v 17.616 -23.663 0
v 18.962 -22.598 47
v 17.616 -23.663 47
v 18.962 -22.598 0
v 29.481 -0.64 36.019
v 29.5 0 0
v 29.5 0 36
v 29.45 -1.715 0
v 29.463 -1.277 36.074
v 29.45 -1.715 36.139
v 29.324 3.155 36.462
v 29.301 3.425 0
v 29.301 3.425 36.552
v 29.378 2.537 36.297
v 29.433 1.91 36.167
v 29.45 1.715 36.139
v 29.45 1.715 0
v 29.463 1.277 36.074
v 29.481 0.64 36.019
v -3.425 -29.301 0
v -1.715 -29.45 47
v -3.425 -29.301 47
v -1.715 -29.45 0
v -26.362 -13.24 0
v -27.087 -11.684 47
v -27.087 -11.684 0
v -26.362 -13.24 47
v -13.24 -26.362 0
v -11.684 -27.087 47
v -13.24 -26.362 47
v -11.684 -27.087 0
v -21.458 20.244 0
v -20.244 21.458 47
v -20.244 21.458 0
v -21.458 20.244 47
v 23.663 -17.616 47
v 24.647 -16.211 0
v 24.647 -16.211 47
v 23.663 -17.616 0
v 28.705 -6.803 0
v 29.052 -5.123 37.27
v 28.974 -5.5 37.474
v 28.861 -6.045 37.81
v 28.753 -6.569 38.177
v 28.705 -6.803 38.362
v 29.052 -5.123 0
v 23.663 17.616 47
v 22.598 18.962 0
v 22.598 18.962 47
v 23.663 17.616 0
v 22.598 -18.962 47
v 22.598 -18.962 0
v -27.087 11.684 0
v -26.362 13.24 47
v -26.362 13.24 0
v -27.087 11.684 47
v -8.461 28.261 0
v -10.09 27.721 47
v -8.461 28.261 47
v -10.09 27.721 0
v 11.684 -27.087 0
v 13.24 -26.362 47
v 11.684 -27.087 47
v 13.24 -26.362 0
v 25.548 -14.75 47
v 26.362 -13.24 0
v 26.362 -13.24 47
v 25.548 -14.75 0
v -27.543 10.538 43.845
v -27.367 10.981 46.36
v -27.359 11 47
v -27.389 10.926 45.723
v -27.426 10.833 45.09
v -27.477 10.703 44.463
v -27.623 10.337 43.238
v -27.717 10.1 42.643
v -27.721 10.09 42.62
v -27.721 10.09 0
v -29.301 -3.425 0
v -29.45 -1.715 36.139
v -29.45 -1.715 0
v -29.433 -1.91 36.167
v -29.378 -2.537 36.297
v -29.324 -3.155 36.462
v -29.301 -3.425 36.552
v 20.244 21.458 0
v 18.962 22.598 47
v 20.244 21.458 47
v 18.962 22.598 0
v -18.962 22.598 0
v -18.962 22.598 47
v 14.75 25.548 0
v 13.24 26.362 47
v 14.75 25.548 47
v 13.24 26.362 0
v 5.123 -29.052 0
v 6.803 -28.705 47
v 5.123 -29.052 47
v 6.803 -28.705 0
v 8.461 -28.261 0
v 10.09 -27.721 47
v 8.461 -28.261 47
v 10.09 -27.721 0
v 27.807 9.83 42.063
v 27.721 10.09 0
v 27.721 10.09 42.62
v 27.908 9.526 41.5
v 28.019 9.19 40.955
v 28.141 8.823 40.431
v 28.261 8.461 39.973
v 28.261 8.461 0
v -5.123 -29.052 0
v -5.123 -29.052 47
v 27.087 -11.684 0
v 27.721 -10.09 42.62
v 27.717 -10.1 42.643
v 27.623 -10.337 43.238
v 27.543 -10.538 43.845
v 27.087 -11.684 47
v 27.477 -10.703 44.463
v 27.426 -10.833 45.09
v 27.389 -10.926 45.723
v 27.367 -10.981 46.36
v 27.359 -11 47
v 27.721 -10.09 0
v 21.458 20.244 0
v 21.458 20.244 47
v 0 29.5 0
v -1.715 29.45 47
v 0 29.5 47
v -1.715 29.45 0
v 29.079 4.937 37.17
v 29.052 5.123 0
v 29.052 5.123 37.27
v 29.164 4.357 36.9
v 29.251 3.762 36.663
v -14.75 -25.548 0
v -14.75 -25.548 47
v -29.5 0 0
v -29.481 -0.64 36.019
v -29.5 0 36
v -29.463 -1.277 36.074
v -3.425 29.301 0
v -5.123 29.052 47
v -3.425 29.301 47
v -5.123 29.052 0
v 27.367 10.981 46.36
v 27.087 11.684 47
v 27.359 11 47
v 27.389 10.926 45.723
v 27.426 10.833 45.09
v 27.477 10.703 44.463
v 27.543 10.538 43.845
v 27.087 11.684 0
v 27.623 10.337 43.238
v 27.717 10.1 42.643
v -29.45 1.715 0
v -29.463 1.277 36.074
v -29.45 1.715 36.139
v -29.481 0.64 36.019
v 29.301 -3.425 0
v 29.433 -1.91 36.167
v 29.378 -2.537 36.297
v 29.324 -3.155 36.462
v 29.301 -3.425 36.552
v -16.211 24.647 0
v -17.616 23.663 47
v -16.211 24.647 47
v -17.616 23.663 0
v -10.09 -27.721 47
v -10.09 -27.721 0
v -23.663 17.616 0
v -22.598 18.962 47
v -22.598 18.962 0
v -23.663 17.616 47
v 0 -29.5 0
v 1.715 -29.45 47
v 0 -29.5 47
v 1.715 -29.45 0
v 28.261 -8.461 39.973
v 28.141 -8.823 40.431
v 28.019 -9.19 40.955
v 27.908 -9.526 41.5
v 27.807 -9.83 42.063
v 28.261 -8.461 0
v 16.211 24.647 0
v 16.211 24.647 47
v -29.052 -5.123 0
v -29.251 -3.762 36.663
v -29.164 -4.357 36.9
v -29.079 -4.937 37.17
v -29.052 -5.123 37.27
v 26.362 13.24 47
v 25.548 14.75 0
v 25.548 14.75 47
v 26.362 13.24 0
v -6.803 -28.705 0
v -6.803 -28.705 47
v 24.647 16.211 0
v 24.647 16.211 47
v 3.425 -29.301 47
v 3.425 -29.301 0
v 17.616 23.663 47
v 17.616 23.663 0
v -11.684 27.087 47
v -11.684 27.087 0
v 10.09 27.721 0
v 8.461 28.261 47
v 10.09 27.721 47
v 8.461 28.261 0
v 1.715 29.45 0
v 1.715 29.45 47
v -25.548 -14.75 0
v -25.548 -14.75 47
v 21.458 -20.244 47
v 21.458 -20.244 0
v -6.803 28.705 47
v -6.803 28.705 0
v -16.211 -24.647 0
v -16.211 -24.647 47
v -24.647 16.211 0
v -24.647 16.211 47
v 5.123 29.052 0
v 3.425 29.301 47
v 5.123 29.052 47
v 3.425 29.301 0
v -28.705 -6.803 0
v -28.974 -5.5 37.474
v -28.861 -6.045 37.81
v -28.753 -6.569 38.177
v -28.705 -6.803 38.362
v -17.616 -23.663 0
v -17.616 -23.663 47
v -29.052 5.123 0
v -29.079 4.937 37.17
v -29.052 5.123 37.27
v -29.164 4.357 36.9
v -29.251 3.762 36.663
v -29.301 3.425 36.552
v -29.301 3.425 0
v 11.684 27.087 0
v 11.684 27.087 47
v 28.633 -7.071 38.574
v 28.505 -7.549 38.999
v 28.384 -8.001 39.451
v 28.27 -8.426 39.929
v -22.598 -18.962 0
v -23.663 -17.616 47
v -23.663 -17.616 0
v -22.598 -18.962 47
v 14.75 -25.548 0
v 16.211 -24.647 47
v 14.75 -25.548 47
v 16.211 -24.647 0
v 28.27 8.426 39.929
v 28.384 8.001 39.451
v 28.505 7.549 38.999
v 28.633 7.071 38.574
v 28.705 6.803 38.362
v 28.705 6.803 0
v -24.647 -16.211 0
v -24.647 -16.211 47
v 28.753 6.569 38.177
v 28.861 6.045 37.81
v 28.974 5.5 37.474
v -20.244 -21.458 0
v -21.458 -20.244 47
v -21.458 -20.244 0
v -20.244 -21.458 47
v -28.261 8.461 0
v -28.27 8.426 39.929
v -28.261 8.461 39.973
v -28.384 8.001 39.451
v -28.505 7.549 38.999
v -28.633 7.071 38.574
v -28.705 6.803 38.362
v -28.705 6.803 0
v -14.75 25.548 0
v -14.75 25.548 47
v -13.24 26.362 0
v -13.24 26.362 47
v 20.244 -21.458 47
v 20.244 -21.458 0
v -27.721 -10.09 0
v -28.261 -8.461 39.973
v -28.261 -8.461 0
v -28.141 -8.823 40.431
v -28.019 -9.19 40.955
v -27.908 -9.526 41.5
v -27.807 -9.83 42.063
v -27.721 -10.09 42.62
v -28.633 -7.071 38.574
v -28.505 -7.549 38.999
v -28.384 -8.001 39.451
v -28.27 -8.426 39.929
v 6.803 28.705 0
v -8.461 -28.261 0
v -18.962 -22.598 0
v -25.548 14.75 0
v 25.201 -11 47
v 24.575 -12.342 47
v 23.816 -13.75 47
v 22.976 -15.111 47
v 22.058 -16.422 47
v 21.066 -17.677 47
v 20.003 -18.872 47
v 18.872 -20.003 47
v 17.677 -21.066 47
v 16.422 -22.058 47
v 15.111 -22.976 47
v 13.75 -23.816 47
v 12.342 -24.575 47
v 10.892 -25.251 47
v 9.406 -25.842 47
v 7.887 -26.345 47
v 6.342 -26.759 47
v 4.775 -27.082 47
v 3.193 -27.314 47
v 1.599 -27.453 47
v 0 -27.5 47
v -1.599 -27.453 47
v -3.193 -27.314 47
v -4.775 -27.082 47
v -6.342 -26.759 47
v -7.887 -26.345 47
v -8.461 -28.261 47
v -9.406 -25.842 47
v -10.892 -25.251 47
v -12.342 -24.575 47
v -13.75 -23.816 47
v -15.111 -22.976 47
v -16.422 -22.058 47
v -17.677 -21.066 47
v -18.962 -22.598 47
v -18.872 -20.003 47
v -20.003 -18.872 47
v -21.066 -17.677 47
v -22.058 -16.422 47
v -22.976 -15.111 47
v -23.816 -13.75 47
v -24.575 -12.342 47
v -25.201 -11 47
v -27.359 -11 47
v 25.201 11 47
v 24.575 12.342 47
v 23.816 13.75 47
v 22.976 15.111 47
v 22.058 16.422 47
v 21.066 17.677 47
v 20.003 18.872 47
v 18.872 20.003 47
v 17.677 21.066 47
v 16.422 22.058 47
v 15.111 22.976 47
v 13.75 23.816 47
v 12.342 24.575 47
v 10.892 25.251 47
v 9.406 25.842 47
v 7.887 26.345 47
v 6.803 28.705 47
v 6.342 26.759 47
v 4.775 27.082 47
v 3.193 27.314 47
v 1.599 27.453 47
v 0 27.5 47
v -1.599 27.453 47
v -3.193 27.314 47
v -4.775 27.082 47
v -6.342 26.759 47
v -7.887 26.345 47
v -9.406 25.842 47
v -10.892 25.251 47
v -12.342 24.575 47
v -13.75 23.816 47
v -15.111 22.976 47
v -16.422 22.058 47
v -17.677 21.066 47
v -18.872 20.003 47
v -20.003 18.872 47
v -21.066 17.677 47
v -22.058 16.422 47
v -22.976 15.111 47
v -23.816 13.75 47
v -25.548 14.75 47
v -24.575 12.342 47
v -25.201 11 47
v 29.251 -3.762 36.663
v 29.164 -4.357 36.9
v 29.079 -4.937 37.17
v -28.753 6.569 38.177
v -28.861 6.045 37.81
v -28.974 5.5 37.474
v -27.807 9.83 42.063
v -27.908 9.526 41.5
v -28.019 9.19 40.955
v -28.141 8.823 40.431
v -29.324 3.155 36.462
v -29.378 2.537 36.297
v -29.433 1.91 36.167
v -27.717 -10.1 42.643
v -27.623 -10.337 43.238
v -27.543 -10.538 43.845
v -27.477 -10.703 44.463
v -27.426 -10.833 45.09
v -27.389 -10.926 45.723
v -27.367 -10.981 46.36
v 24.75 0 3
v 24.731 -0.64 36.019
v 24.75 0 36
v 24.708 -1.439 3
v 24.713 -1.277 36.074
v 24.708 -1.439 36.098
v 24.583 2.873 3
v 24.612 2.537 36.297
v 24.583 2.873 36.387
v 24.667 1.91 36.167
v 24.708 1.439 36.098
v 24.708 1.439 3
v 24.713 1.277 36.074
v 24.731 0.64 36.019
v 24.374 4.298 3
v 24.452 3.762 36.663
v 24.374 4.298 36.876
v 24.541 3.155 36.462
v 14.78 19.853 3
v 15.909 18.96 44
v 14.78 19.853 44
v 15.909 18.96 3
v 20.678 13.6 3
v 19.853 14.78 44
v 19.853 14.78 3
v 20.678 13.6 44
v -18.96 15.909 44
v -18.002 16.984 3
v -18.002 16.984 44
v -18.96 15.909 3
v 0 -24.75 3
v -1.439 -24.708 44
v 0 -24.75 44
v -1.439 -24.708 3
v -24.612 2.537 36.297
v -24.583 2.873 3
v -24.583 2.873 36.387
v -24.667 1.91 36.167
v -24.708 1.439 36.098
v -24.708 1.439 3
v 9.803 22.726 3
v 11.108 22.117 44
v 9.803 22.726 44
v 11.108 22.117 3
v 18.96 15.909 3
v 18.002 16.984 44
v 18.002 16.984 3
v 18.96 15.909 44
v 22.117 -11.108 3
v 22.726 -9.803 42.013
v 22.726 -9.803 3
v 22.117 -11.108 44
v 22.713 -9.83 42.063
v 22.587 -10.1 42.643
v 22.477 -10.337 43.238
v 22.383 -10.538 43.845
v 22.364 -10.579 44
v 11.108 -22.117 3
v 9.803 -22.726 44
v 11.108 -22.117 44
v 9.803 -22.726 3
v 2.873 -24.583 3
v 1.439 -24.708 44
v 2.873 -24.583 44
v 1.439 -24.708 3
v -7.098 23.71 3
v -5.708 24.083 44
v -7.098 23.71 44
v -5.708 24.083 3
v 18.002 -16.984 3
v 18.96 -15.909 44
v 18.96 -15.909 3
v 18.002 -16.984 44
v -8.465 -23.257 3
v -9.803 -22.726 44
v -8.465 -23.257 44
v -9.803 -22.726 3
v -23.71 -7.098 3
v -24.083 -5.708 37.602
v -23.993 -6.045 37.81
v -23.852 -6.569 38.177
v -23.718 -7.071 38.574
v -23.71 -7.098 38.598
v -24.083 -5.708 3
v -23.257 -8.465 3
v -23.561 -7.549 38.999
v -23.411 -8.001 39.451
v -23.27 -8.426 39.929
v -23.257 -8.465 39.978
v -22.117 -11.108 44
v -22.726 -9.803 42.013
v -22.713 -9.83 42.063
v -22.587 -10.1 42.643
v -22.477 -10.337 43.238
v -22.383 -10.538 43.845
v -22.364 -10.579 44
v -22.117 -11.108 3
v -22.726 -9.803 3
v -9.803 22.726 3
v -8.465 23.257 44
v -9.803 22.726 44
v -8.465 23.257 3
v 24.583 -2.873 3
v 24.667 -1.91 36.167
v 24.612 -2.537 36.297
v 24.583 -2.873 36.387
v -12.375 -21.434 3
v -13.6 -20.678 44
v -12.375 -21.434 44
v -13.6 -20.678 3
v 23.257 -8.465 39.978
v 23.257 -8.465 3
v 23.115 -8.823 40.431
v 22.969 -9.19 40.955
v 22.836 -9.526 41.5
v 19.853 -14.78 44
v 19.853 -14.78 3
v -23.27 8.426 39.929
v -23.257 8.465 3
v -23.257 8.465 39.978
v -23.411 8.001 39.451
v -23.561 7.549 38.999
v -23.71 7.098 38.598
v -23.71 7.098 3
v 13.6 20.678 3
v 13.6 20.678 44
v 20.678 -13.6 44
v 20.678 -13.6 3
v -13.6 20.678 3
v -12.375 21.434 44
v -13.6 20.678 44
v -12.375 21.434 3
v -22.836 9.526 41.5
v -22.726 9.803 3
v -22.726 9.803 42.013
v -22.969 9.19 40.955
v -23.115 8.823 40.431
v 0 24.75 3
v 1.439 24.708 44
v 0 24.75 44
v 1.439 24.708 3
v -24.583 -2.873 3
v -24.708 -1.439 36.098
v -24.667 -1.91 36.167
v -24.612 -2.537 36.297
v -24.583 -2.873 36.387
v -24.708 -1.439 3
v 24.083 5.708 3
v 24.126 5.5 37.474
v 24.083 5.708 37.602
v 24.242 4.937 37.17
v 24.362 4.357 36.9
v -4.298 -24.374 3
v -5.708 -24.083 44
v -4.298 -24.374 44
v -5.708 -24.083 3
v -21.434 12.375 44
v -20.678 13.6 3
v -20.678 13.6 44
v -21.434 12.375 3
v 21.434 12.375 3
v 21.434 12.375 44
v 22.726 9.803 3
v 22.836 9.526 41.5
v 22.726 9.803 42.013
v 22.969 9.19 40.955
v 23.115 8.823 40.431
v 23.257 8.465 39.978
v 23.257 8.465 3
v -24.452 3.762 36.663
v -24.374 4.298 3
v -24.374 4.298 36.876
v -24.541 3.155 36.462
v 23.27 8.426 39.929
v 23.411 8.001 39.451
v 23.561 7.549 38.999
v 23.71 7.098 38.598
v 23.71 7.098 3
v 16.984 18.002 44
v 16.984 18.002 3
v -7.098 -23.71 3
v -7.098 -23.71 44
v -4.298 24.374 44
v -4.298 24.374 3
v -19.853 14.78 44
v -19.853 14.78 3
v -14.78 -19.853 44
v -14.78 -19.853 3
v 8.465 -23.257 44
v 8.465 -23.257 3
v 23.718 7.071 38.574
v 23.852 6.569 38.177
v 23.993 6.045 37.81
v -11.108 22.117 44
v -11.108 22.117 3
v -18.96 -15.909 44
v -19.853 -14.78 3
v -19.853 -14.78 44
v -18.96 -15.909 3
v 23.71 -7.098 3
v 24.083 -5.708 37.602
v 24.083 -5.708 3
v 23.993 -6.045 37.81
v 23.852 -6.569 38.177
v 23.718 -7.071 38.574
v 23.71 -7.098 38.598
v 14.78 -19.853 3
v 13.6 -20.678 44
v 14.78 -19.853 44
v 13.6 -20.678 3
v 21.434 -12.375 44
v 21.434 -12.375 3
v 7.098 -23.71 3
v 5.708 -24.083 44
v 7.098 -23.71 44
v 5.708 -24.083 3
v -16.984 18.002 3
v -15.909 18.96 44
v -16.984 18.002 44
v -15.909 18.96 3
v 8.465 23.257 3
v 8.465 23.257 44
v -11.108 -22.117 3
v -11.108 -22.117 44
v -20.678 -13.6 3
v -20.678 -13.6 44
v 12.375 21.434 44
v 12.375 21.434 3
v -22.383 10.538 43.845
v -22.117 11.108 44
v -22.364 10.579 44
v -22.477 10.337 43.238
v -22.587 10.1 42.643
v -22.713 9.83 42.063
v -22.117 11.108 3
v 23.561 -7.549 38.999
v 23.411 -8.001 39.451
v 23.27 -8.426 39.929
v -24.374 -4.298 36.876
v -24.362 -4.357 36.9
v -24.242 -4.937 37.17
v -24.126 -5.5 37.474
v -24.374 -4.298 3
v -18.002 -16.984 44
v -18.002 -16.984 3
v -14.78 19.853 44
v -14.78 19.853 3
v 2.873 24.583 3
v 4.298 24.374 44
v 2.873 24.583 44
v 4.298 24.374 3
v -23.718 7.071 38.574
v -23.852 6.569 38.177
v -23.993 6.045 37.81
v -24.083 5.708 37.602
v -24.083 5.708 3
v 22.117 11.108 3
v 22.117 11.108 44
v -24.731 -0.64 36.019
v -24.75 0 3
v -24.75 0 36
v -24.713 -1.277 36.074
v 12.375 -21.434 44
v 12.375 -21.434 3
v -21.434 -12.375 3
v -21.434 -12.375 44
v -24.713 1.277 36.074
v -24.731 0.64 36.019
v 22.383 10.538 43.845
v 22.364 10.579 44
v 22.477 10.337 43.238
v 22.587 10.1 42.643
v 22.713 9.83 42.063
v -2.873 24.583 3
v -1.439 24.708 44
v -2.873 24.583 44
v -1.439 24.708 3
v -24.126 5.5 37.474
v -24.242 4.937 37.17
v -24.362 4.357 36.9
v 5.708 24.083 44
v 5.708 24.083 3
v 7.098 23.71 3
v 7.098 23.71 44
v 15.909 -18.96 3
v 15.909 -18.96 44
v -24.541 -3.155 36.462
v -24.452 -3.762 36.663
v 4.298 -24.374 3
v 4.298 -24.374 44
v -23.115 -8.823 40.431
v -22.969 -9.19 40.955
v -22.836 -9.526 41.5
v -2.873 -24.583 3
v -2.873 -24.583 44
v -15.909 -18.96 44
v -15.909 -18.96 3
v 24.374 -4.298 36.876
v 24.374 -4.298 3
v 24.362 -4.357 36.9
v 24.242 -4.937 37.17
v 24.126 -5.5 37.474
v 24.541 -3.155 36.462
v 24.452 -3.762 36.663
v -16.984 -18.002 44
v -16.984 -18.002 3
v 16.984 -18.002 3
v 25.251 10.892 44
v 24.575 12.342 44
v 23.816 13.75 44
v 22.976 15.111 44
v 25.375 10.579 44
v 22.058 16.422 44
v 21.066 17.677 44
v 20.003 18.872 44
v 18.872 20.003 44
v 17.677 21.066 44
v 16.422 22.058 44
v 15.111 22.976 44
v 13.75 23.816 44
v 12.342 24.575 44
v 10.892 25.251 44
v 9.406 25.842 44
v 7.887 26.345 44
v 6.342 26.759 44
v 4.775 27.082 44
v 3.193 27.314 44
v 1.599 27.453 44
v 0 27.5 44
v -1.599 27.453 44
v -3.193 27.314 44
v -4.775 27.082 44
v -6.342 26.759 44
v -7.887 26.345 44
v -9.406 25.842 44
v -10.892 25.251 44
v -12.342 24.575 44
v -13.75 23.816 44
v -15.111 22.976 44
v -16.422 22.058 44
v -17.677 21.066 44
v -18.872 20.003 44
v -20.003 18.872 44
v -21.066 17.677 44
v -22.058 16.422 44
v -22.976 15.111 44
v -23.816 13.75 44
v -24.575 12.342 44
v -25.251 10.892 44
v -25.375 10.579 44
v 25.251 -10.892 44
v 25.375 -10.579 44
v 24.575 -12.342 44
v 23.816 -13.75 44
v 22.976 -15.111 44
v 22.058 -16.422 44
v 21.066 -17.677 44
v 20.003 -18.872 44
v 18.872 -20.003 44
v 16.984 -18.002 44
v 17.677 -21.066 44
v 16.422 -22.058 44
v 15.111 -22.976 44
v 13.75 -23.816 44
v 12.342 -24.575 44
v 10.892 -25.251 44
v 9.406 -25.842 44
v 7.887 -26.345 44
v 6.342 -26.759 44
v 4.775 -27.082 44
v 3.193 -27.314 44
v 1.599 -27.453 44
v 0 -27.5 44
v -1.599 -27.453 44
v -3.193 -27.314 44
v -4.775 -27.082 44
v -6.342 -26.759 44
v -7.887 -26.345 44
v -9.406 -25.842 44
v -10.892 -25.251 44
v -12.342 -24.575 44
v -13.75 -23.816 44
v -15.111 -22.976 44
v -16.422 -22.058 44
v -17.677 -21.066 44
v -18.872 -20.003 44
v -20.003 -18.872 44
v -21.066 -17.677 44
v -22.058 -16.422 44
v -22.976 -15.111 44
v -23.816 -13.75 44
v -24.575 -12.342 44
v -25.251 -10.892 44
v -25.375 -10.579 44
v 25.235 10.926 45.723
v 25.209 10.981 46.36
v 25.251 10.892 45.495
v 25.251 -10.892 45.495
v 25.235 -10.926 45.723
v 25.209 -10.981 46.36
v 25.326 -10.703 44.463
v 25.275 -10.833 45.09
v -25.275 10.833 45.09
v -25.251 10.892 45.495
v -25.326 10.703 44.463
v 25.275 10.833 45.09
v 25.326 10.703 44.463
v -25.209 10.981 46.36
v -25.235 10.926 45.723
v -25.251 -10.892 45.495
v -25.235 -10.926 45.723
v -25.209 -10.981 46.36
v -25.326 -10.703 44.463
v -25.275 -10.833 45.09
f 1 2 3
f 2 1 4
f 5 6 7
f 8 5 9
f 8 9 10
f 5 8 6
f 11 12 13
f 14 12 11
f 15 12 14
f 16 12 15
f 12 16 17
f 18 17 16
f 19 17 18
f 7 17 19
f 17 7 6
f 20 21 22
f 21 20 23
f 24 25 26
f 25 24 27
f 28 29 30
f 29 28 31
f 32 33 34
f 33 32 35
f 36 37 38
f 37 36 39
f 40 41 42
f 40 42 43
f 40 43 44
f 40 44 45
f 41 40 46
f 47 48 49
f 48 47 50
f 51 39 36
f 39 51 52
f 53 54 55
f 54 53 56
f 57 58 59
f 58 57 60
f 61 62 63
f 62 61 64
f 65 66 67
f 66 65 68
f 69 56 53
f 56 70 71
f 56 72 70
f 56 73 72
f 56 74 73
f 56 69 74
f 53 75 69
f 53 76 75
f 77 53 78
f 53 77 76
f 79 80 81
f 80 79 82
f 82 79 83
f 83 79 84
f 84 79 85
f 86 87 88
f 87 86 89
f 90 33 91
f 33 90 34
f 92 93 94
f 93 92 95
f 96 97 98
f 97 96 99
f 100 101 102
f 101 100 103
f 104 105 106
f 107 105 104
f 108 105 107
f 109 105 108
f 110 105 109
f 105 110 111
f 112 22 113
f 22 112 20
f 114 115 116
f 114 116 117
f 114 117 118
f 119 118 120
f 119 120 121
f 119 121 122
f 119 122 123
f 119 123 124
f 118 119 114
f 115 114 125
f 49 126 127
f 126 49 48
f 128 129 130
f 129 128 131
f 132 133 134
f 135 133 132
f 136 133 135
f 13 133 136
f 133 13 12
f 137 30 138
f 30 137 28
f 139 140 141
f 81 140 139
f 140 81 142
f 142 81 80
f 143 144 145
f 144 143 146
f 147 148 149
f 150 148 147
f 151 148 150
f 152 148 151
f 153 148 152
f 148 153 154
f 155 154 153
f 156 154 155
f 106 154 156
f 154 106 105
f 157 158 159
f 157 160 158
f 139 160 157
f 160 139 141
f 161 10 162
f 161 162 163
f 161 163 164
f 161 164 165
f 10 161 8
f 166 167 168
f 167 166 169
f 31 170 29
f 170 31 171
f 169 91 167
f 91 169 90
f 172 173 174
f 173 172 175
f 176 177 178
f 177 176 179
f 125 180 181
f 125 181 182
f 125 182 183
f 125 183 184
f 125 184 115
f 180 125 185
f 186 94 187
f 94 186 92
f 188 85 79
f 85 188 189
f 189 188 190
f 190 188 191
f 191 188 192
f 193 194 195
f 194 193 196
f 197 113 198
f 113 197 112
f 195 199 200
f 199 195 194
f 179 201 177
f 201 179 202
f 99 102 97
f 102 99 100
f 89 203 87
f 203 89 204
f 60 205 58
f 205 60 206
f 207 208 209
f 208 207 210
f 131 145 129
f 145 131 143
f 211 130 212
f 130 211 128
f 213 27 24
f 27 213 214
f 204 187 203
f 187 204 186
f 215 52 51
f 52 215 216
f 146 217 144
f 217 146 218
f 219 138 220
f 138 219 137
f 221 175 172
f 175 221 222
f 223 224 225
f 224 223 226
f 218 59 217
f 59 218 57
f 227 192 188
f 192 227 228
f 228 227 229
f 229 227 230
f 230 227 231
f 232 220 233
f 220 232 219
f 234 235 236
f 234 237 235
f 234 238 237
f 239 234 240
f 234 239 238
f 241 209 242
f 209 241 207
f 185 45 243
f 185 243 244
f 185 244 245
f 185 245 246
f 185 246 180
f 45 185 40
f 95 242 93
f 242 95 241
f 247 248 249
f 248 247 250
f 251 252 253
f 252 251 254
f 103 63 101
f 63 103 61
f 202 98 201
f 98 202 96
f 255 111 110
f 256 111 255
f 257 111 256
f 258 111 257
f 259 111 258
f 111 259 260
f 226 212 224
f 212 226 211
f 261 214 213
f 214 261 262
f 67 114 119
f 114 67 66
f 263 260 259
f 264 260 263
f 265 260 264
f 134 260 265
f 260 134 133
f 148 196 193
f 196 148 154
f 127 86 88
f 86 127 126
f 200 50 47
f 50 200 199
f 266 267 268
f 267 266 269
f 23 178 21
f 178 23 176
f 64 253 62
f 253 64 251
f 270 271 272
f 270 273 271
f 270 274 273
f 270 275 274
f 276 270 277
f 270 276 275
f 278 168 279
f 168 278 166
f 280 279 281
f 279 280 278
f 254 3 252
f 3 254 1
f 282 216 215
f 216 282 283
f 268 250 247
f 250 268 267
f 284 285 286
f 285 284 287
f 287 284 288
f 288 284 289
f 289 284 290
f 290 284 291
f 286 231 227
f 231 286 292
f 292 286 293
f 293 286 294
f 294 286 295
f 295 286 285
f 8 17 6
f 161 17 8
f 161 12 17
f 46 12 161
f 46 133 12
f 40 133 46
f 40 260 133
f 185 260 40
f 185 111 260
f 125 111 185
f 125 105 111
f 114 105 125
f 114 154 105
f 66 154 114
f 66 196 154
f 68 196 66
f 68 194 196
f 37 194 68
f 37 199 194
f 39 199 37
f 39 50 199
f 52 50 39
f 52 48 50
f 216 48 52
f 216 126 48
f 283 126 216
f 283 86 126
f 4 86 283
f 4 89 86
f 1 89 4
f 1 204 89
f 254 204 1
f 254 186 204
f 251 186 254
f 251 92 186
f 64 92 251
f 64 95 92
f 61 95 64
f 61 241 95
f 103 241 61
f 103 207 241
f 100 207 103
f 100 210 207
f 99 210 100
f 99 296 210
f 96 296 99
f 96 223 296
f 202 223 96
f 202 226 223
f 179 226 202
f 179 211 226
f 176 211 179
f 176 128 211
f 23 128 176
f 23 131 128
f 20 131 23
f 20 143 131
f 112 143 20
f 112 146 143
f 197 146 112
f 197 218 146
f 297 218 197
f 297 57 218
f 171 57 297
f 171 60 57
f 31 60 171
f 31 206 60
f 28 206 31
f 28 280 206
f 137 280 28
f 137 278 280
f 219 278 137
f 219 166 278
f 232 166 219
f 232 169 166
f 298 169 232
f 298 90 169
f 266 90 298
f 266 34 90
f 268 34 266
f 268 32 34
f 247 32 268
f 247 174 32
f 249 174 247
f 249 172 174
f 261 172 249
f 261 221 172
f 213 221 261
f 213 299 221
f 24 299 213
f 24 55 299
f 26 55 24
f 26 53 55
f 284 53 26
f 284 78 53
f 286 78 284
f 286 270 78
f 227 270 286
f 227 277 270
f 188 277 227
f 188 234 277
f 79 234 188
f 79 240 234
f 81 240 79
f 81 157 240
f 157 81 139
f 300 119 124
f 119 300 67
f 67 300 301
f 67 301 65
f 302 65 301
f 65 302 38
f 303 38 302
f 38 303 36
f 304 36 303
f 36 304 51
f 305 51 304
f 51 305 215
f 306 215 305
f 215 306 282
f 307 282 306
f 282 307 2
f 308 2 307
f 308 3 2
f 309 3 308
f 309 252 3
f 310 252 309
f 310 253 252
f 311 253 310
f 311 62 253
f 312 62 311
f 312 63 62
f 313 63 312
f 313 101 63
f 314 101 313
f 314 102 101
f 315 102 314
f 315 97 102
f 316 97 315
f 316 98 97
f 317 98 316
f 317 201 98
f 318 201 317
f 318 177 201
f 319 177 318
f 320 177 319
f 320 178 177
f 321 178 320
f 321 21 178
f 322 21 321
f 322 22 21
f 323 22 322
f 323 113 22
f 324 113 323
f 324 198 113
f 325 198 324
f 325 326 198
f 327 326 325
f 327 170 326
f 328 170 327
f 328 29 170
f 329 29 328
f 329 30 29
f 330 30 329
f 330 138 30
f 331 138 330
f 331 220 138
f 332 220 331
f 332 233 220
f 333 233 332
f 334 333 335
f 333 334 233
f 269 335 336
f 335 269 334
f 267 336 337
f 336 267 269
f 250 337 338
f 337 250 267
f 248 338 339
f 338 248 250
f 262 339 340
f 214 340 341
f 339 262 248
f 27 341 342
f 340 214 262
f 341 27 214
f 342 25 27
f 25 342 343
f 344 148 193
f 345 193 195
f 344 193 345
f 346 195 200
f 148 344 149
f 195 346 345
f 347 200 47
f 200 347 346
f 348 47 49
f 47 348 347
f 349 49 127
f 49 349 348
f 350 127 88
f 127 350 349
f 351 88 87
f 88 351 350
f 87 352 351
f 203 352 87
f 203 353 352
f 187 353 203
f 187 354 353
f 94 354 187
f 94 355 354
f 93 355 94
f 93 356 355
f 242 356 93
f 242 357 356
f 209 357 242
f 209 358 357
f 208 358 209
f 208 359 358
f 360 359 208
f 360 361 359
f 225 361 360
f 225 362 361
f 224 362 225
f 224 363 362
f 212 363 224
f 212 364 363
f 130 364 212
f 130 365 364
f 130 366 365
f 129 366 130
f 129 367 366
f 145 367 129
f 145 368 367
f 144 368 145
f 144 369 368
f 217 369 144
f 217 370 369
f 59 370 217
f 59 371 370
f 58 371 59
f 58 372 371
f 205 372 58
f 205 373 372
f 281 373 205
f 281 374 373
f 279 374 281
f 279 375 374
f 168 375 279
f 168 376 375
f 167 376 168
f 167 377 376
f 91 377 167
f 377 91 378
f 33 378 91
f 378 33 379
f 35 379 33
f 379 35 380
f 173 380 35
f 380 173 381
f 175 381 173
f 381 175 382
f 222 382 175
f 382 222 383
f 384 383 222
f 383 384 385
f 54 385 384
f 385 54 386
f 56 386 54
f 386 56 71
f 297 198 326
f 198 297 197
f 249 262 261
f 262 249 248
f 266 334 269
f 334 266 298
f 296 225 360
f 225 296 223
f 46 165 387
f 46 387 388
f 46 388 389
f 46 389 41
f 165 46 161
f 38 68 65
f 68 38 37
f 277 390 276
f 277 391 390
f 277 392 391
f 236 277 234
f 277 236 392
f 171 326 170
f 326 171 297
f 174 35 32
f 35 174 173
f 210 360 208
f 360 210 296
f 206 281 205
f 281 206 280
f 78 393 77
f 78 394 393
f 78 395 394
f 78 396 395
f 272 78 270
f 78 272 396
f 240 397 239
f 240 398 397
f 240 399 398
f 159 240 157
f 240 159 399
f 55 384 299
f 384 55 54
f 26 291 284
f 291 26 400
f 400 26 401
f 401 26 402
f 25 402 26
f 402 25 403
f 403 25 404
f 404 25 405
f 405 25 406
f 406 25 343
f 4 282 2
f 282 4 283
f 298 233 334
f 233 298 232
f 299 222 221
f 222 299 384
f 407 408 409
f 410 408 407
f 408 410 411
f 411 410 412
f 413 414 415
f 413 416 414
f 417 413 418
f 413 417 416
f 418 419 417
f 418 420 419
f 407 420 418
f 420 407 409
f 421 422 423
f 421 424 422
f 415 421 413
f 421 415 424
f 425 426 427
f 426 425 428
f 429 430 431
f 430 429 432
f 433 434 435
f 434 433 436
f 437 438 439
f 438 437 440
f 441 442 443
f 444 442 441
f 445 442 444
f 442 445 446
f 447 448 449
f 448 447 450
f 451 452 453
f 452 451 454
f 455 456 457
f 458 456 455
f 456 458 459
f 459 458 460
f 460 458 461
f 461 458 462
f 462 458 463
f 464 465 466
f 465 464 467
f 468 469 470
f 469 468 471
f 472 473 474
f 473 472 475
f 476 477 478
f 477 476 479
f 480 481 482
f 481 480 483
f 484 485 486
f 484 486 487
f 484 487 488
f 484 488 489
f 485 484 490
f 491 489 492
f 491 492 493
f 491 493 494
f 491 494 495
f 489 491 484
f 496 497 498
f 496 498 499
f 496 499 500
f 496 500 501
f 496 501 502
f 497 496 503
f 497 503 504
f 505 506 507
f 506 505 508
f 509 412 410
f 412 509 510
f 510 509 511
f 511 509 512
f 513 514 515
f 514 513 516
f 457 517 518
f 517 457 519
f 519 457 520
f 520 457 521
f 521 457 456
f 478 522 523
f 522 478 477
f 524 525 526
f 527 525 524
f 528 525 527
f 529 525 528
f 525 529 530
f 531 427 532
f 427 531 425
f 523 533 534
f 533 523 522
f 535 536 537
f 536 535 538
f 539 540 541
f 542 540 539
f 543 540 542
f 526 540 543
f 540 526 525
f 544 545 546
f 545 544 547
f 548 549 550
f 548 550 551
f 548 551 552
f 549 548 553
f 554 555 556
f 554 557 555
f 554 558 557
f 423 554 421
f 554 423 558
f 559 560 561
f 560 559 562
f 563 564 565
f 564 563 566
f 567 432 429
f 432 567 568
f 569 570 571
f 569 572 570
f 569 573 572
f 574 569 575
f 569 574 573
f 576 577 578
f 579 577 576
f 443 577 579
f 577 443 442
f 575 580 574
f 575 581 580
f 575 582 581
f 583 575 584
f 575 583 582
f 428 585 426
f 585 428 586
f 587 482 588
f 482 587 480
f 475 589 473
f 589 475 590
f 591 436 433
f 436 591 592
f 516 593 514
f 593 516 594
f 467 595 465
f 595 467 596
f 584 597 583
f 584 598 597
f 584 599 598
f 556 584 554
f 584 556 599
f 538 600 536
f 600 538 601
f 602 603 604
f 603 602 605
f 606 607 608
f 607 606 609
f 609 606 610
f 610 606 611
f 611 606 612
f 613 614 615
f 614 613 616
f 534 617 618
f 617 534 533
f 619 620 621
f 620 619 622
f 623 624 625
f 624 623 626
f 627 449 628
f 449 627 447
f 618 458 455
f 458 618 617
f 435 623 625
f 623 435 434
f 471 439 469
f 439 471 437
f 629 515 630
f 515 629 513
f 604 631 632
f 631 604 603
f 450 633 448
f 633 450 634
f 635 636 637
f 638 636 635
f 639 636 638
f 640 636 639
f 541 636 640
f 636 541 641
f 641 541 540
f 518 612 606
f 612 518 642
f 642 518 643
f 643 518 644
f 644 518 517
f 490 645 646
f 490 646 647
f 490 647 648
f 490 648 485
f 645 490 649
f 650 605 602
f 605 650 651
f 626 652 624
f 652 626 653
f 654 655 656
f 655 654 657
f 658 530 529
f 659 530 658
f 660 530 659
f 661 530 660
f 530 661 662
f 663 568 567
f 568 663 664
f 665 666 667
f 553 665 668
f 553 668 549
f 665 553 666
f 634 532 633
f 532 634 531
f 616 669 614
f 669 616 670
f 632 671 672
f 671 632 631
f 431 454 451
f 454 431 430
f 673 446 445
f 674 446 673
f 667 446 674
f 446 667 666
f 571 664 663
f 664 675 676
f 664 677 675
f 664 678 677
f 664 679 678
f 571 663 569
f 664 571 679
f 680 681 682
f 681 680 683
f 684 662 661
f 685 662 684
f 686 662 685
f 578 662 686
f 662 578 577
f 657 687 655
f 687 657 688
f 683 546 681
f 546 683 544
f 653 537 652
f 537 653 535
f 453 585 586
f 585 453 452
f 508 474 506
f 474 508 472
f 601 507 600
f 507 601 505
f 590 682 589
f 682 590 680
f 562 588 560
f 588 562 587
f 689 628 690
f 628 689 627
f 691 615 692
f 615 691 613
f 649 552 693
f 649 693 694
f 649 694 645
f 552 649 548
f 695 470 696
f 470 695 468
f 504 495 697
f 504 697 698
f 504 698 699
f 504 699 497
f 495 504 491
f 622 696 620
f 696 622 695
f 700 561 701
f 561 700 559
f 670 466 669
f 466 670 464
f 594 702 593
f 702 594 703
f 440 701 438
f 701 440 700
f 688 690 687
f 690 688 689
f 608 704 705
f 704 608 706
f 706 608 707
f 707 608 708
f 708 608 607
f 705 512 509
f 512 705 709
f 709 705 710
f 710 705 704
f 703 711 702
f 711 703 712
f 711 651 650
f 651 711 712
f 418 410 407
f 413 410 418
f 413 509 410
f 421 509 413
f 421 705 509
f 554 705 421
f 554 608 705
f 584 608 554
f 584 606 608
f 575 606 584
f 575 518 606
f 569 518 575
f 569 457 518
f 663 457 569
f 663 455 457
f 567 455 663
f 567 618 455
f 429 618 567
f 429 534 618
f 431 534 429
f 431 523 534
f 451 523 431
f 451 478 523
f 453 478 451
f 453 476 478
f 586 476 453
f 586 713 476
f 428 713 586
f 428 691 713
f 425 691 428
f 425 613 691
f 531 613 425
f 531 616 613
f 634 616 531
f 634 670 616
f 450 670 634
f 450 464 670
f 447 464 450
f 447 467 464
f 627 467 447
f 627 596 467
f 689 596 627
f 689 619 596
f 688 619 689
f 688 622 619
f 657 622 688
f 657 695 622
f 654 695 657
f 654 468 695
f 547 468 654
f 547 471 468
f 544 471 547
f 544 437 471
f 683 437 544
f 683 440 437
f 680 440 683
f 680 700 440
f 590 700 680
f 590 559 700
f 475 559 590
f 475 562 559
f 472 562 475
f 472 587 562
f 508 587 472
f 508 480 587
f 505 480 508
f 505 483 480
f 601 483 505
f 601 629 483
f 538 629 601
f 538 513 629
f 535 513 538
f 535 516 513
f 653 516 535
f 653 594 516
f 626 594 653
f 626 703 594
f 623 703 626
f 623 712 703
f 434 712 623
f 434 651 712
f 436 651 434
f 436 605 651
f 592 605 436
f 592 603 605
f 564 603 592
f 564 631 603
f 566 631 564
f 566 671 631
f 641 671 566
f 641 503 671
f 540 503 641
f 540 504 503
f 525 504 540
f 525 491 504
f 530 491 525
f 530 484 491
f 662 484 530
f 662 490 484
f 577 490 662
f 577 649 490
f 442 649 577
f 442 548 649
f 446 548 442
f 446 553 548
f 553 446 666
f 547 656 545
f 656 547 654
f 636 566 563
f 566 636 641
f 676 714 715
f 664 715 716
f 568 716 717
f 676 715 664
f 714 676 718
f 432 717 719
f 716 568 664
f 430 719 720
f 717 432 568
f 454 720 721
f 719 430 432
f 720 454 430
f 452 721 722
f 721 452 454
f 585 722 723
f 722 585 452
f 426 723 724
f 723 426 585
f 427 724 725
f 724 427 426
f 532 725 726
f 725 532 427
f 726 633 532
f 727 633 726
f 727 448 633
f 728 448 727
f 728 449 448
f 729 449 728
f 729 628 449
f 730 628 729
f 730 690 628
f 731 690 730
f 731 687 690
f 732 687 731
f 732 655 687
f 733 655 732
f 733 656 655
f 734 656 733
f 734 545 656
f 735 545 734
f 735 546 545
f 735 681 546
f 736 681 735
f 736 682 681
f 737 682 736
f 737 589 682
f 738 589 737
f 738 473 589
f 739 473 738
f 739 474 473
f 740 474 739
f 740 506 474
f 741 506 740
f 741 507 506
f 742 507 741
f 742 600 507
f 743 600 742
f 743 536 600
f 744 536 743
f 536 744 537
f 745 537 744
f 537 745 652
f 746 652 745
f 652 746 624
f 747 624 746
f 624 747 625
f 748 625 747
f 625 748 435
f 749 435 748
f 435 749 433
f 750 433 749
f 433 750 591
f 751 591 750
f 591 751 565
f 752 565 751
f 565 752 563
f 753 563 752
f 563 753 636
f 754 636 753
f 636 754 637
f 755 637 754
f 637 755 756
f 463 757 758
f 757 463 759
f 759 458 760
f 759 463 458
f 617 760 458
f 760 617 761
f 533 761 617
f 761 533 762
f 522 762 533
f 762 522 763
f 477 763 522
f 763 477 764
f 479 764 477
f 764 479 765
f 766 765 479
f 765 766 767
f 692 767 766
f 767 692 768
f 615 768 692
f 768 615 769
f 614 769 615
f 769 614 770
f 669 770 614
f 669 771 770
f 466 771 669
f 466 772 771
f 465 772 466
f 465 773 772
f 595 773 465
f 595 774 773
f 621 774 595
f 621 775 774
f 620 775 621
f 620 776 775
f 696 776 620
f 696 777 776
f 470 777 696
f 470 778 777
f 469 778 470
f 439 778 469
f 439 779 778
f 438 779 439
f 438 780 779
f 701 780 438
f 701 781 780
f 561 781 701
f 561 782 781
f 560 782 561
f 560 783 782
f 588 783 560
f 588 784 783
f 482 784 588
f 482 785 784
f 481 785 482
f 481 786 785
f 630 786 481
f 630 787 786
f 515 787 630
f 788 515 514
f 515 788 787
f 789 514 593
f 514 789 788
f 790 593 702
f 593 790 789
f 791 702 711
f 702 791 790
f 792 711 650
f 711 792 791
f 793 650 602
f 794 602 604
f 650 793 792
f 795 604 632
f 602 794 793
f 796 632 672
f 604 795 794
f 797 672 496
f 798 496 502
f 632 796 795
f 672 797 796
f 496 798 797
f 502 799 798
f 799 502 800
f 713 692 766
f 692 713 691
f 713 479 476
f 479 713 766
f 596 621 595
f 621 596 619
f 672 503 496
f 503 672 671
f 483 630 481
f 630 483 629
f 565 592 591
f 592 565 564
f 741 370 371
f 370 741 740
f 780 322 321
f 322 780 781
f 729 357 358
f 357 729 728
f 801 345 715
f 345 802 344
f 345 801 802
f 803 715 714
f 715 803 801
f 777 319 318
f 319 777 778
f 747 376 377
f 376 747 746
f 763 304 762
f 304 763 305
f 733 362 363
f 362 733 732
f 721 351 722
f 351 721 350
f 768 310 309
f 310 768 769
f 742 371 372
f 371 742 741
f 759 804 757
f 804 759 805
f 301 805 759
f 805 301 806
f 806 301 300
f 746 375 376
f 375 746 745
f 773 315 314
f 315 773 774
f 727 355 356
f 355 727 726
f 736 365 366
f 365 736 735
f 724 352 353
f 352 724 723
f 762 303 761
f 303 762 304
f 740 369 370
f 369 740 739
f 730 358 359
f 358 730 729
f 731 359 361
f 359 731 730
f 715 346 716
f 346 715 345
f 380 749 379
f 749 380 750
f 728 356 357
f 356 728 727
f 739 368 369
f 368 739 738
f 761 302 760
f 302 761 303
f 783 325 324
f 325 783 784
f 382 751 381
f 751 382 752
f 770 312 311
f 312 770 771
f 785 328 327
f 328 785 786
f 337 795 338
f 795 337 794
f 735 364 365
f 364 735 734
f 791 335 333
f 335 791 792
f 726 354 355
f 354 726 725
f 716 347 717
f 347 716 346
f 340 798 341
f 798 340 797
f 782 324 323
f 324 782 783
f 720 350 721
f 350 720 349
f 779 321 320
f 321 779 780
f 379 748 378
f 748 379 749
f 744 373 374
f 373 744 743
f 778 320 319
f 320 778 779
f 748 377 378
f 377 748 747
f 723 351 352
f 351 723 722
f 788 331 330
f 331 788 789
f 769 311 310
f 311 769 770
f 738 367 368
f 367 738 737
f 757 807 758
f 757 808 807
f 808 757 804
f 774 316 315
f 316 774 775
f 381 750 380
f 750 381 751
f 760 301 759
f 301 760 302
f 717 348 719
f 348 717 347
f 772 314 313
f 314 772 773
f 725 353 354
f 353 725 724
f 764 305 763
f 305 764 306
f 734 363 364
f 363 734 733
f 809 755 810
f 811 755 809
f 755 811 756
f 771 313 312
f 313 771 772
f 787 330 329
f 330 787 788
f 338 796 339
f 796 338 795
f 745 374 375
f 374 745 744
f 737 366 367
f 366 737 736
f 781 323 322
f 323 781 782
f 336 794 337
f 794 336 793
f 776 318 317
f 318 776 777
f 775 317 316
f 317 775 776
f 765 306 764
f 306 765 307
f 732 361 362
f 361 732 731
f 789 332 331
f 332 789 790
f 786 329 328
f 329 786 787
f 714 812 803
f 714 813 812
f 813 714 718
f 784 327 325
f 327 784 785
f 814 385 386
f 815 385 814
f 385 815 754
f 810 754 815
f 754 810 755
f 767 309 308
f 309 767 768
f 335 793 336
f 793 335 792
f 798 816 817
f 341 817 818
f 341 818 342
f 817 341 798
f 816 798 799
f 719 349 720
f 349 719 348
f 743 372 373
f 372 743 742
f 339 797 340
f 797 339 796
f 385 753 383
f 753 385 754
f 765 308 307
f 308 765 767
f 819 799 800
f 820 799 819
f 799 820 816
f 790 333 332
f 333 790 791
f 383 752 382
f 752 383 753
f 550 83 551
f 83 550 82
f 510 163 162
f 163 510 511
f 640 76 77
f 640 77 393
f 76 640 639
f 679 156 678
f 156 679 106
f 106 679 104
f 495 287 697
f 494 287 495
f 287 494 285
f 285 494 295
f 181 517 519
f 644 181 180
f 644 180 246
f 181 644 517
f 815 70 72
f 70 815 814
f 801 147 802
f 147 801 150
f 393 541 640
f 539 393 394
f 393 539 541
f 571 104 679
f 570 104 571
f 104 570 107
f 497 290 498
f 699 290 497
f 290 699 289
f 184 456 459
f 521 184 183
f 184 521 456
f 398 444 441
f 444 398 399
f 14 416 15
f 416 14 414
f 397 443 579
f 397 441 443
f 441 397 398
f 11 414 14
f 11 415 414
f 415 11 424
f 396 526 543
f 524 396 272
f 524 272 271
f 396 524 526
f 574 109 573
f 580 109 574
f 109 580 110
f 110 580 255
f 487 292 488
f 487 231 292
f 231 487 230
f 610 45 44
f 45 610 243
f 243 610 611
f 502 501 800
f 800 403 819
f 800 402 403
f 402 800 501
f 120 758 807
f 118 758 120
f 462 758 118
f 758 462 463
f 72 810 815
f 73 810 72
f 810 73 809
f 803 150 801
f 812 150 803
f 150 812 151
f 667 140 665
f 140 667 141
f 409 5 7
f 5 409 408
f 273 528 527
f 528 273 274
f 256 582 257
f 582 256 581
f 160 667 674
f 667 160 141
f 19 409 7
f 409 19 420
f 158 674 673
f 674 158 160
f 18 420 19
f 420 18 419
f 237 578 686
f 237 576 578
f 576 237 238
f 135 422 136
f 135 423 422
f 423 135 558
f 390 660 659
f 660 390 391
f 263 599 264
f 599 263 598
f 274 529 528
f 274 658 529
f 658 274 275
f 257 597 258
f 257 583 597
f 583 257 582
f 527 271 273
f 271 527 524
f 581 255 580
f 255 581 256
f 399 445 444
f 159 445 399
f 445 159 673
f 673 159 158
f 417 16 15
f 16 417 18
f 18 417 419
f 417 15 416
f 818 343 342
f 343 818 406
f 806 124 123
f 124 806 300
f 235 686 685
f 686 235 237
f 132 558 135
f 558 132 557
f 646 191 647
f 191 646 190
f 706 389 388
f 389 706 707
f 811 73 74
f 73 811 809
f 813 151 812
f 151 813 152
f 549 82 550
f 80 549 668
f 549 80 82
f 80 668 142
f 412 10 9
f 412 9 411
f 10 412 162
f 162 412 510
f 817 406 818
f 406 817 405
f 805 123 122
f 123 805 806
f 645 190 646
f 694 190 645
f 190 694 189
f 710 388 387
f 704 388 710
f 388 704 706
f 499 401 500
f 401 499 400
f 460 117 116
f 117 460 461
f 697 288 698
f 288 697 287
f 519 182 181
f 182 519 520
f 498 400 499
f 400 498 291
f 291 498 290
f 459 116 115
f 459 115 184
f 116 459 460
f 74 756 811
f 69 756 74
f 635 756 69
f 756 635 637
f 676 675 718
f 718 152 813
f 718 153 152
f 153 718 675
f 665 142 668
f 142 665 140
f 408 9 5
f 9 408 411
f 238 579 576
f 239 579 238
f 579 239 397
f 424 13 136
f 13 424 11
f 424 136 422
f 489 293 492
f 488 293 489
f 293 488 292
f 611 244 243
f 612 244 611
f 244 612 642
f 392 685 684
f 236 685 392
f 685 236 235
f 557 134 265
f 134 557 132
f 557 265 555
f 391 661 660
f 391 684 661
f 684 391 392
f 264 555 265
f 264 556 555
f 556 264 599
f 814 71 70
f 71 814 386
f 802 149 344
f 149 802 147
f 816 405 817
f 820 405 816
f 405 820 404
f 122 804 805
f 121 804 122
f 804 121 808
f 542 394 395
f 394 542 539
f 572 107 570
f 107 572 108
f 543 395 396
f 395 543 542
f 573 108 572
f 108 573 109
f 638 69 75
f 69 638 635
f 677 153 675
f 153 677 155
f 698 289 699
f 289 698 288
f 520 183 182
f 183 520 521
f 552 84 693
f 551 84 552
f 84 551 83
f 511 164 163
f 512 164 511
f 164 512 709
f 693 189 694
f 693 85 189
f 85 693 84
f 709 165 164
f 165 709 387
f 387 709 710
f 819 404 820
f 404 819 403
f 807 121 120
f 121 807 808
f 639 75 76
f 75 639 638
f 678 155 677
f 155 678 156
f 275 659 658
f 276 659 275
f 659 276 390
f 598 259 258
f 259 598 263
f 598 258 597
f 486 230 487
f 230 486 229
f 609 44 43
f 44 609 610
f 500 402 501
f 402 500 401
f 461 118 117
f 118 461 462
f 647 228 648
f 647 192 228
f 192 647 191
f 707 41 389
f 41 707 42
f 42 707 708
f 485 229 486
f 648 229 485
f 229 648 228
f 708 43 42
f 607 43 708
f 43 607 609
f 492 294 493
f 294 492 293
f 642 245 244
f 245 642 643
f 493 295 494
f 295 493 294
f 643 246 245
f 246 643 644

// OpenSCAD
$fn=108;
/*[recovery capsule]*/
//cover diameter (mm)
outer_diameter=53.0;
//maximum diameter of the rest body (mm)
inner_diameter=47.5;
//capsule height (mm)
height=38.0;
/*[holder]*/
//distance between capsule cover and outer wall
outer_gap=1;
//outer wall height
outer_wall_height=3;
//outer wall thickness
outer_wall_thickness=2;
//distance between body and inner wall
inner_gap=1;
// bottom thickness
bottom_thickness=3;
distance_bottom_capsule=3;
//diameter for the two lift holes 
lift_hole_diameter=22;

module holder0(outer_diameter,height,outer_gap,outer_wall_height,outer_wall_thickness,bottom_thickness,distance_bottom_capsule){
    tot_height=bottom_thickness+distance_bottom_capsule+height+outer_wall_height;
translate([0,0,tot_height/2])
cylinder(tot_height,(outer_diameter+2*outer_gap+2*outer_wall_thickness)/2,(outer_diameter+2*outer_gap+2*outer_wall_thickness)/2,center=true);
}

module holder1(inner_diameter,height,inner_gap,bottom_thickness,distance_bottom_capsule){
    tot_height1=height+distance_bottom_capsule;
    translate([0,0,tot_height1/2+bottom_thickness])
    cylinder(tot_height1,(inner_diameter+2*inner_gap)/2,(inner_diameter+2*inner_gap)/2,center=true);    
    }

module holder2(outer_diameter,height,outer_gap,outer_wall_height,bottom_thickness,distance_bottom_capsule){
    tot_height2=outer_wall_height;
    translate([0,0,tot_height2/2+bottom_thickness+distance_bottom_capsule+height])
    cylinder(tot_height2,(outer_diameter+2*outer_gap)/2,(outer_diameter+2*outer_gap)/2,center=true);    
    }


module lifthole(lift_hole_diameter,outer_diameter,height,outer_wall_height,bottom_thickness,distance_bottom_capsule){
    tot_height3=bottom_thickness+distance_bottom_capsule+height+outer_wall_height;
    translate([0,0,tot_height3])
    rotate([0,90,0])
    cylinder(2*outer_diameter,lift_hole_diameter/2,lift_hole_diameter/2,center=true);
    
    
    }


difference(){
holder0(outer_diameter,height,outer_gap,outer_wall_height,outer_wall_thickness,bottom_thickness,distance_bottom_capsule);
    
    holder1(inner_diameter,height,inner_gap,bottom_thickness,distance_bottom_capsule);
    
    holder2(outer_diameter,height,outer_gap,outer_wall_height,bottom_thickness,distance_bottom_capsule);
    
    lifthole(lift_hole_diameter,outer_diameter,height,outer_wall_height,bottom_thickness,distance_bottom_capsule);
}
